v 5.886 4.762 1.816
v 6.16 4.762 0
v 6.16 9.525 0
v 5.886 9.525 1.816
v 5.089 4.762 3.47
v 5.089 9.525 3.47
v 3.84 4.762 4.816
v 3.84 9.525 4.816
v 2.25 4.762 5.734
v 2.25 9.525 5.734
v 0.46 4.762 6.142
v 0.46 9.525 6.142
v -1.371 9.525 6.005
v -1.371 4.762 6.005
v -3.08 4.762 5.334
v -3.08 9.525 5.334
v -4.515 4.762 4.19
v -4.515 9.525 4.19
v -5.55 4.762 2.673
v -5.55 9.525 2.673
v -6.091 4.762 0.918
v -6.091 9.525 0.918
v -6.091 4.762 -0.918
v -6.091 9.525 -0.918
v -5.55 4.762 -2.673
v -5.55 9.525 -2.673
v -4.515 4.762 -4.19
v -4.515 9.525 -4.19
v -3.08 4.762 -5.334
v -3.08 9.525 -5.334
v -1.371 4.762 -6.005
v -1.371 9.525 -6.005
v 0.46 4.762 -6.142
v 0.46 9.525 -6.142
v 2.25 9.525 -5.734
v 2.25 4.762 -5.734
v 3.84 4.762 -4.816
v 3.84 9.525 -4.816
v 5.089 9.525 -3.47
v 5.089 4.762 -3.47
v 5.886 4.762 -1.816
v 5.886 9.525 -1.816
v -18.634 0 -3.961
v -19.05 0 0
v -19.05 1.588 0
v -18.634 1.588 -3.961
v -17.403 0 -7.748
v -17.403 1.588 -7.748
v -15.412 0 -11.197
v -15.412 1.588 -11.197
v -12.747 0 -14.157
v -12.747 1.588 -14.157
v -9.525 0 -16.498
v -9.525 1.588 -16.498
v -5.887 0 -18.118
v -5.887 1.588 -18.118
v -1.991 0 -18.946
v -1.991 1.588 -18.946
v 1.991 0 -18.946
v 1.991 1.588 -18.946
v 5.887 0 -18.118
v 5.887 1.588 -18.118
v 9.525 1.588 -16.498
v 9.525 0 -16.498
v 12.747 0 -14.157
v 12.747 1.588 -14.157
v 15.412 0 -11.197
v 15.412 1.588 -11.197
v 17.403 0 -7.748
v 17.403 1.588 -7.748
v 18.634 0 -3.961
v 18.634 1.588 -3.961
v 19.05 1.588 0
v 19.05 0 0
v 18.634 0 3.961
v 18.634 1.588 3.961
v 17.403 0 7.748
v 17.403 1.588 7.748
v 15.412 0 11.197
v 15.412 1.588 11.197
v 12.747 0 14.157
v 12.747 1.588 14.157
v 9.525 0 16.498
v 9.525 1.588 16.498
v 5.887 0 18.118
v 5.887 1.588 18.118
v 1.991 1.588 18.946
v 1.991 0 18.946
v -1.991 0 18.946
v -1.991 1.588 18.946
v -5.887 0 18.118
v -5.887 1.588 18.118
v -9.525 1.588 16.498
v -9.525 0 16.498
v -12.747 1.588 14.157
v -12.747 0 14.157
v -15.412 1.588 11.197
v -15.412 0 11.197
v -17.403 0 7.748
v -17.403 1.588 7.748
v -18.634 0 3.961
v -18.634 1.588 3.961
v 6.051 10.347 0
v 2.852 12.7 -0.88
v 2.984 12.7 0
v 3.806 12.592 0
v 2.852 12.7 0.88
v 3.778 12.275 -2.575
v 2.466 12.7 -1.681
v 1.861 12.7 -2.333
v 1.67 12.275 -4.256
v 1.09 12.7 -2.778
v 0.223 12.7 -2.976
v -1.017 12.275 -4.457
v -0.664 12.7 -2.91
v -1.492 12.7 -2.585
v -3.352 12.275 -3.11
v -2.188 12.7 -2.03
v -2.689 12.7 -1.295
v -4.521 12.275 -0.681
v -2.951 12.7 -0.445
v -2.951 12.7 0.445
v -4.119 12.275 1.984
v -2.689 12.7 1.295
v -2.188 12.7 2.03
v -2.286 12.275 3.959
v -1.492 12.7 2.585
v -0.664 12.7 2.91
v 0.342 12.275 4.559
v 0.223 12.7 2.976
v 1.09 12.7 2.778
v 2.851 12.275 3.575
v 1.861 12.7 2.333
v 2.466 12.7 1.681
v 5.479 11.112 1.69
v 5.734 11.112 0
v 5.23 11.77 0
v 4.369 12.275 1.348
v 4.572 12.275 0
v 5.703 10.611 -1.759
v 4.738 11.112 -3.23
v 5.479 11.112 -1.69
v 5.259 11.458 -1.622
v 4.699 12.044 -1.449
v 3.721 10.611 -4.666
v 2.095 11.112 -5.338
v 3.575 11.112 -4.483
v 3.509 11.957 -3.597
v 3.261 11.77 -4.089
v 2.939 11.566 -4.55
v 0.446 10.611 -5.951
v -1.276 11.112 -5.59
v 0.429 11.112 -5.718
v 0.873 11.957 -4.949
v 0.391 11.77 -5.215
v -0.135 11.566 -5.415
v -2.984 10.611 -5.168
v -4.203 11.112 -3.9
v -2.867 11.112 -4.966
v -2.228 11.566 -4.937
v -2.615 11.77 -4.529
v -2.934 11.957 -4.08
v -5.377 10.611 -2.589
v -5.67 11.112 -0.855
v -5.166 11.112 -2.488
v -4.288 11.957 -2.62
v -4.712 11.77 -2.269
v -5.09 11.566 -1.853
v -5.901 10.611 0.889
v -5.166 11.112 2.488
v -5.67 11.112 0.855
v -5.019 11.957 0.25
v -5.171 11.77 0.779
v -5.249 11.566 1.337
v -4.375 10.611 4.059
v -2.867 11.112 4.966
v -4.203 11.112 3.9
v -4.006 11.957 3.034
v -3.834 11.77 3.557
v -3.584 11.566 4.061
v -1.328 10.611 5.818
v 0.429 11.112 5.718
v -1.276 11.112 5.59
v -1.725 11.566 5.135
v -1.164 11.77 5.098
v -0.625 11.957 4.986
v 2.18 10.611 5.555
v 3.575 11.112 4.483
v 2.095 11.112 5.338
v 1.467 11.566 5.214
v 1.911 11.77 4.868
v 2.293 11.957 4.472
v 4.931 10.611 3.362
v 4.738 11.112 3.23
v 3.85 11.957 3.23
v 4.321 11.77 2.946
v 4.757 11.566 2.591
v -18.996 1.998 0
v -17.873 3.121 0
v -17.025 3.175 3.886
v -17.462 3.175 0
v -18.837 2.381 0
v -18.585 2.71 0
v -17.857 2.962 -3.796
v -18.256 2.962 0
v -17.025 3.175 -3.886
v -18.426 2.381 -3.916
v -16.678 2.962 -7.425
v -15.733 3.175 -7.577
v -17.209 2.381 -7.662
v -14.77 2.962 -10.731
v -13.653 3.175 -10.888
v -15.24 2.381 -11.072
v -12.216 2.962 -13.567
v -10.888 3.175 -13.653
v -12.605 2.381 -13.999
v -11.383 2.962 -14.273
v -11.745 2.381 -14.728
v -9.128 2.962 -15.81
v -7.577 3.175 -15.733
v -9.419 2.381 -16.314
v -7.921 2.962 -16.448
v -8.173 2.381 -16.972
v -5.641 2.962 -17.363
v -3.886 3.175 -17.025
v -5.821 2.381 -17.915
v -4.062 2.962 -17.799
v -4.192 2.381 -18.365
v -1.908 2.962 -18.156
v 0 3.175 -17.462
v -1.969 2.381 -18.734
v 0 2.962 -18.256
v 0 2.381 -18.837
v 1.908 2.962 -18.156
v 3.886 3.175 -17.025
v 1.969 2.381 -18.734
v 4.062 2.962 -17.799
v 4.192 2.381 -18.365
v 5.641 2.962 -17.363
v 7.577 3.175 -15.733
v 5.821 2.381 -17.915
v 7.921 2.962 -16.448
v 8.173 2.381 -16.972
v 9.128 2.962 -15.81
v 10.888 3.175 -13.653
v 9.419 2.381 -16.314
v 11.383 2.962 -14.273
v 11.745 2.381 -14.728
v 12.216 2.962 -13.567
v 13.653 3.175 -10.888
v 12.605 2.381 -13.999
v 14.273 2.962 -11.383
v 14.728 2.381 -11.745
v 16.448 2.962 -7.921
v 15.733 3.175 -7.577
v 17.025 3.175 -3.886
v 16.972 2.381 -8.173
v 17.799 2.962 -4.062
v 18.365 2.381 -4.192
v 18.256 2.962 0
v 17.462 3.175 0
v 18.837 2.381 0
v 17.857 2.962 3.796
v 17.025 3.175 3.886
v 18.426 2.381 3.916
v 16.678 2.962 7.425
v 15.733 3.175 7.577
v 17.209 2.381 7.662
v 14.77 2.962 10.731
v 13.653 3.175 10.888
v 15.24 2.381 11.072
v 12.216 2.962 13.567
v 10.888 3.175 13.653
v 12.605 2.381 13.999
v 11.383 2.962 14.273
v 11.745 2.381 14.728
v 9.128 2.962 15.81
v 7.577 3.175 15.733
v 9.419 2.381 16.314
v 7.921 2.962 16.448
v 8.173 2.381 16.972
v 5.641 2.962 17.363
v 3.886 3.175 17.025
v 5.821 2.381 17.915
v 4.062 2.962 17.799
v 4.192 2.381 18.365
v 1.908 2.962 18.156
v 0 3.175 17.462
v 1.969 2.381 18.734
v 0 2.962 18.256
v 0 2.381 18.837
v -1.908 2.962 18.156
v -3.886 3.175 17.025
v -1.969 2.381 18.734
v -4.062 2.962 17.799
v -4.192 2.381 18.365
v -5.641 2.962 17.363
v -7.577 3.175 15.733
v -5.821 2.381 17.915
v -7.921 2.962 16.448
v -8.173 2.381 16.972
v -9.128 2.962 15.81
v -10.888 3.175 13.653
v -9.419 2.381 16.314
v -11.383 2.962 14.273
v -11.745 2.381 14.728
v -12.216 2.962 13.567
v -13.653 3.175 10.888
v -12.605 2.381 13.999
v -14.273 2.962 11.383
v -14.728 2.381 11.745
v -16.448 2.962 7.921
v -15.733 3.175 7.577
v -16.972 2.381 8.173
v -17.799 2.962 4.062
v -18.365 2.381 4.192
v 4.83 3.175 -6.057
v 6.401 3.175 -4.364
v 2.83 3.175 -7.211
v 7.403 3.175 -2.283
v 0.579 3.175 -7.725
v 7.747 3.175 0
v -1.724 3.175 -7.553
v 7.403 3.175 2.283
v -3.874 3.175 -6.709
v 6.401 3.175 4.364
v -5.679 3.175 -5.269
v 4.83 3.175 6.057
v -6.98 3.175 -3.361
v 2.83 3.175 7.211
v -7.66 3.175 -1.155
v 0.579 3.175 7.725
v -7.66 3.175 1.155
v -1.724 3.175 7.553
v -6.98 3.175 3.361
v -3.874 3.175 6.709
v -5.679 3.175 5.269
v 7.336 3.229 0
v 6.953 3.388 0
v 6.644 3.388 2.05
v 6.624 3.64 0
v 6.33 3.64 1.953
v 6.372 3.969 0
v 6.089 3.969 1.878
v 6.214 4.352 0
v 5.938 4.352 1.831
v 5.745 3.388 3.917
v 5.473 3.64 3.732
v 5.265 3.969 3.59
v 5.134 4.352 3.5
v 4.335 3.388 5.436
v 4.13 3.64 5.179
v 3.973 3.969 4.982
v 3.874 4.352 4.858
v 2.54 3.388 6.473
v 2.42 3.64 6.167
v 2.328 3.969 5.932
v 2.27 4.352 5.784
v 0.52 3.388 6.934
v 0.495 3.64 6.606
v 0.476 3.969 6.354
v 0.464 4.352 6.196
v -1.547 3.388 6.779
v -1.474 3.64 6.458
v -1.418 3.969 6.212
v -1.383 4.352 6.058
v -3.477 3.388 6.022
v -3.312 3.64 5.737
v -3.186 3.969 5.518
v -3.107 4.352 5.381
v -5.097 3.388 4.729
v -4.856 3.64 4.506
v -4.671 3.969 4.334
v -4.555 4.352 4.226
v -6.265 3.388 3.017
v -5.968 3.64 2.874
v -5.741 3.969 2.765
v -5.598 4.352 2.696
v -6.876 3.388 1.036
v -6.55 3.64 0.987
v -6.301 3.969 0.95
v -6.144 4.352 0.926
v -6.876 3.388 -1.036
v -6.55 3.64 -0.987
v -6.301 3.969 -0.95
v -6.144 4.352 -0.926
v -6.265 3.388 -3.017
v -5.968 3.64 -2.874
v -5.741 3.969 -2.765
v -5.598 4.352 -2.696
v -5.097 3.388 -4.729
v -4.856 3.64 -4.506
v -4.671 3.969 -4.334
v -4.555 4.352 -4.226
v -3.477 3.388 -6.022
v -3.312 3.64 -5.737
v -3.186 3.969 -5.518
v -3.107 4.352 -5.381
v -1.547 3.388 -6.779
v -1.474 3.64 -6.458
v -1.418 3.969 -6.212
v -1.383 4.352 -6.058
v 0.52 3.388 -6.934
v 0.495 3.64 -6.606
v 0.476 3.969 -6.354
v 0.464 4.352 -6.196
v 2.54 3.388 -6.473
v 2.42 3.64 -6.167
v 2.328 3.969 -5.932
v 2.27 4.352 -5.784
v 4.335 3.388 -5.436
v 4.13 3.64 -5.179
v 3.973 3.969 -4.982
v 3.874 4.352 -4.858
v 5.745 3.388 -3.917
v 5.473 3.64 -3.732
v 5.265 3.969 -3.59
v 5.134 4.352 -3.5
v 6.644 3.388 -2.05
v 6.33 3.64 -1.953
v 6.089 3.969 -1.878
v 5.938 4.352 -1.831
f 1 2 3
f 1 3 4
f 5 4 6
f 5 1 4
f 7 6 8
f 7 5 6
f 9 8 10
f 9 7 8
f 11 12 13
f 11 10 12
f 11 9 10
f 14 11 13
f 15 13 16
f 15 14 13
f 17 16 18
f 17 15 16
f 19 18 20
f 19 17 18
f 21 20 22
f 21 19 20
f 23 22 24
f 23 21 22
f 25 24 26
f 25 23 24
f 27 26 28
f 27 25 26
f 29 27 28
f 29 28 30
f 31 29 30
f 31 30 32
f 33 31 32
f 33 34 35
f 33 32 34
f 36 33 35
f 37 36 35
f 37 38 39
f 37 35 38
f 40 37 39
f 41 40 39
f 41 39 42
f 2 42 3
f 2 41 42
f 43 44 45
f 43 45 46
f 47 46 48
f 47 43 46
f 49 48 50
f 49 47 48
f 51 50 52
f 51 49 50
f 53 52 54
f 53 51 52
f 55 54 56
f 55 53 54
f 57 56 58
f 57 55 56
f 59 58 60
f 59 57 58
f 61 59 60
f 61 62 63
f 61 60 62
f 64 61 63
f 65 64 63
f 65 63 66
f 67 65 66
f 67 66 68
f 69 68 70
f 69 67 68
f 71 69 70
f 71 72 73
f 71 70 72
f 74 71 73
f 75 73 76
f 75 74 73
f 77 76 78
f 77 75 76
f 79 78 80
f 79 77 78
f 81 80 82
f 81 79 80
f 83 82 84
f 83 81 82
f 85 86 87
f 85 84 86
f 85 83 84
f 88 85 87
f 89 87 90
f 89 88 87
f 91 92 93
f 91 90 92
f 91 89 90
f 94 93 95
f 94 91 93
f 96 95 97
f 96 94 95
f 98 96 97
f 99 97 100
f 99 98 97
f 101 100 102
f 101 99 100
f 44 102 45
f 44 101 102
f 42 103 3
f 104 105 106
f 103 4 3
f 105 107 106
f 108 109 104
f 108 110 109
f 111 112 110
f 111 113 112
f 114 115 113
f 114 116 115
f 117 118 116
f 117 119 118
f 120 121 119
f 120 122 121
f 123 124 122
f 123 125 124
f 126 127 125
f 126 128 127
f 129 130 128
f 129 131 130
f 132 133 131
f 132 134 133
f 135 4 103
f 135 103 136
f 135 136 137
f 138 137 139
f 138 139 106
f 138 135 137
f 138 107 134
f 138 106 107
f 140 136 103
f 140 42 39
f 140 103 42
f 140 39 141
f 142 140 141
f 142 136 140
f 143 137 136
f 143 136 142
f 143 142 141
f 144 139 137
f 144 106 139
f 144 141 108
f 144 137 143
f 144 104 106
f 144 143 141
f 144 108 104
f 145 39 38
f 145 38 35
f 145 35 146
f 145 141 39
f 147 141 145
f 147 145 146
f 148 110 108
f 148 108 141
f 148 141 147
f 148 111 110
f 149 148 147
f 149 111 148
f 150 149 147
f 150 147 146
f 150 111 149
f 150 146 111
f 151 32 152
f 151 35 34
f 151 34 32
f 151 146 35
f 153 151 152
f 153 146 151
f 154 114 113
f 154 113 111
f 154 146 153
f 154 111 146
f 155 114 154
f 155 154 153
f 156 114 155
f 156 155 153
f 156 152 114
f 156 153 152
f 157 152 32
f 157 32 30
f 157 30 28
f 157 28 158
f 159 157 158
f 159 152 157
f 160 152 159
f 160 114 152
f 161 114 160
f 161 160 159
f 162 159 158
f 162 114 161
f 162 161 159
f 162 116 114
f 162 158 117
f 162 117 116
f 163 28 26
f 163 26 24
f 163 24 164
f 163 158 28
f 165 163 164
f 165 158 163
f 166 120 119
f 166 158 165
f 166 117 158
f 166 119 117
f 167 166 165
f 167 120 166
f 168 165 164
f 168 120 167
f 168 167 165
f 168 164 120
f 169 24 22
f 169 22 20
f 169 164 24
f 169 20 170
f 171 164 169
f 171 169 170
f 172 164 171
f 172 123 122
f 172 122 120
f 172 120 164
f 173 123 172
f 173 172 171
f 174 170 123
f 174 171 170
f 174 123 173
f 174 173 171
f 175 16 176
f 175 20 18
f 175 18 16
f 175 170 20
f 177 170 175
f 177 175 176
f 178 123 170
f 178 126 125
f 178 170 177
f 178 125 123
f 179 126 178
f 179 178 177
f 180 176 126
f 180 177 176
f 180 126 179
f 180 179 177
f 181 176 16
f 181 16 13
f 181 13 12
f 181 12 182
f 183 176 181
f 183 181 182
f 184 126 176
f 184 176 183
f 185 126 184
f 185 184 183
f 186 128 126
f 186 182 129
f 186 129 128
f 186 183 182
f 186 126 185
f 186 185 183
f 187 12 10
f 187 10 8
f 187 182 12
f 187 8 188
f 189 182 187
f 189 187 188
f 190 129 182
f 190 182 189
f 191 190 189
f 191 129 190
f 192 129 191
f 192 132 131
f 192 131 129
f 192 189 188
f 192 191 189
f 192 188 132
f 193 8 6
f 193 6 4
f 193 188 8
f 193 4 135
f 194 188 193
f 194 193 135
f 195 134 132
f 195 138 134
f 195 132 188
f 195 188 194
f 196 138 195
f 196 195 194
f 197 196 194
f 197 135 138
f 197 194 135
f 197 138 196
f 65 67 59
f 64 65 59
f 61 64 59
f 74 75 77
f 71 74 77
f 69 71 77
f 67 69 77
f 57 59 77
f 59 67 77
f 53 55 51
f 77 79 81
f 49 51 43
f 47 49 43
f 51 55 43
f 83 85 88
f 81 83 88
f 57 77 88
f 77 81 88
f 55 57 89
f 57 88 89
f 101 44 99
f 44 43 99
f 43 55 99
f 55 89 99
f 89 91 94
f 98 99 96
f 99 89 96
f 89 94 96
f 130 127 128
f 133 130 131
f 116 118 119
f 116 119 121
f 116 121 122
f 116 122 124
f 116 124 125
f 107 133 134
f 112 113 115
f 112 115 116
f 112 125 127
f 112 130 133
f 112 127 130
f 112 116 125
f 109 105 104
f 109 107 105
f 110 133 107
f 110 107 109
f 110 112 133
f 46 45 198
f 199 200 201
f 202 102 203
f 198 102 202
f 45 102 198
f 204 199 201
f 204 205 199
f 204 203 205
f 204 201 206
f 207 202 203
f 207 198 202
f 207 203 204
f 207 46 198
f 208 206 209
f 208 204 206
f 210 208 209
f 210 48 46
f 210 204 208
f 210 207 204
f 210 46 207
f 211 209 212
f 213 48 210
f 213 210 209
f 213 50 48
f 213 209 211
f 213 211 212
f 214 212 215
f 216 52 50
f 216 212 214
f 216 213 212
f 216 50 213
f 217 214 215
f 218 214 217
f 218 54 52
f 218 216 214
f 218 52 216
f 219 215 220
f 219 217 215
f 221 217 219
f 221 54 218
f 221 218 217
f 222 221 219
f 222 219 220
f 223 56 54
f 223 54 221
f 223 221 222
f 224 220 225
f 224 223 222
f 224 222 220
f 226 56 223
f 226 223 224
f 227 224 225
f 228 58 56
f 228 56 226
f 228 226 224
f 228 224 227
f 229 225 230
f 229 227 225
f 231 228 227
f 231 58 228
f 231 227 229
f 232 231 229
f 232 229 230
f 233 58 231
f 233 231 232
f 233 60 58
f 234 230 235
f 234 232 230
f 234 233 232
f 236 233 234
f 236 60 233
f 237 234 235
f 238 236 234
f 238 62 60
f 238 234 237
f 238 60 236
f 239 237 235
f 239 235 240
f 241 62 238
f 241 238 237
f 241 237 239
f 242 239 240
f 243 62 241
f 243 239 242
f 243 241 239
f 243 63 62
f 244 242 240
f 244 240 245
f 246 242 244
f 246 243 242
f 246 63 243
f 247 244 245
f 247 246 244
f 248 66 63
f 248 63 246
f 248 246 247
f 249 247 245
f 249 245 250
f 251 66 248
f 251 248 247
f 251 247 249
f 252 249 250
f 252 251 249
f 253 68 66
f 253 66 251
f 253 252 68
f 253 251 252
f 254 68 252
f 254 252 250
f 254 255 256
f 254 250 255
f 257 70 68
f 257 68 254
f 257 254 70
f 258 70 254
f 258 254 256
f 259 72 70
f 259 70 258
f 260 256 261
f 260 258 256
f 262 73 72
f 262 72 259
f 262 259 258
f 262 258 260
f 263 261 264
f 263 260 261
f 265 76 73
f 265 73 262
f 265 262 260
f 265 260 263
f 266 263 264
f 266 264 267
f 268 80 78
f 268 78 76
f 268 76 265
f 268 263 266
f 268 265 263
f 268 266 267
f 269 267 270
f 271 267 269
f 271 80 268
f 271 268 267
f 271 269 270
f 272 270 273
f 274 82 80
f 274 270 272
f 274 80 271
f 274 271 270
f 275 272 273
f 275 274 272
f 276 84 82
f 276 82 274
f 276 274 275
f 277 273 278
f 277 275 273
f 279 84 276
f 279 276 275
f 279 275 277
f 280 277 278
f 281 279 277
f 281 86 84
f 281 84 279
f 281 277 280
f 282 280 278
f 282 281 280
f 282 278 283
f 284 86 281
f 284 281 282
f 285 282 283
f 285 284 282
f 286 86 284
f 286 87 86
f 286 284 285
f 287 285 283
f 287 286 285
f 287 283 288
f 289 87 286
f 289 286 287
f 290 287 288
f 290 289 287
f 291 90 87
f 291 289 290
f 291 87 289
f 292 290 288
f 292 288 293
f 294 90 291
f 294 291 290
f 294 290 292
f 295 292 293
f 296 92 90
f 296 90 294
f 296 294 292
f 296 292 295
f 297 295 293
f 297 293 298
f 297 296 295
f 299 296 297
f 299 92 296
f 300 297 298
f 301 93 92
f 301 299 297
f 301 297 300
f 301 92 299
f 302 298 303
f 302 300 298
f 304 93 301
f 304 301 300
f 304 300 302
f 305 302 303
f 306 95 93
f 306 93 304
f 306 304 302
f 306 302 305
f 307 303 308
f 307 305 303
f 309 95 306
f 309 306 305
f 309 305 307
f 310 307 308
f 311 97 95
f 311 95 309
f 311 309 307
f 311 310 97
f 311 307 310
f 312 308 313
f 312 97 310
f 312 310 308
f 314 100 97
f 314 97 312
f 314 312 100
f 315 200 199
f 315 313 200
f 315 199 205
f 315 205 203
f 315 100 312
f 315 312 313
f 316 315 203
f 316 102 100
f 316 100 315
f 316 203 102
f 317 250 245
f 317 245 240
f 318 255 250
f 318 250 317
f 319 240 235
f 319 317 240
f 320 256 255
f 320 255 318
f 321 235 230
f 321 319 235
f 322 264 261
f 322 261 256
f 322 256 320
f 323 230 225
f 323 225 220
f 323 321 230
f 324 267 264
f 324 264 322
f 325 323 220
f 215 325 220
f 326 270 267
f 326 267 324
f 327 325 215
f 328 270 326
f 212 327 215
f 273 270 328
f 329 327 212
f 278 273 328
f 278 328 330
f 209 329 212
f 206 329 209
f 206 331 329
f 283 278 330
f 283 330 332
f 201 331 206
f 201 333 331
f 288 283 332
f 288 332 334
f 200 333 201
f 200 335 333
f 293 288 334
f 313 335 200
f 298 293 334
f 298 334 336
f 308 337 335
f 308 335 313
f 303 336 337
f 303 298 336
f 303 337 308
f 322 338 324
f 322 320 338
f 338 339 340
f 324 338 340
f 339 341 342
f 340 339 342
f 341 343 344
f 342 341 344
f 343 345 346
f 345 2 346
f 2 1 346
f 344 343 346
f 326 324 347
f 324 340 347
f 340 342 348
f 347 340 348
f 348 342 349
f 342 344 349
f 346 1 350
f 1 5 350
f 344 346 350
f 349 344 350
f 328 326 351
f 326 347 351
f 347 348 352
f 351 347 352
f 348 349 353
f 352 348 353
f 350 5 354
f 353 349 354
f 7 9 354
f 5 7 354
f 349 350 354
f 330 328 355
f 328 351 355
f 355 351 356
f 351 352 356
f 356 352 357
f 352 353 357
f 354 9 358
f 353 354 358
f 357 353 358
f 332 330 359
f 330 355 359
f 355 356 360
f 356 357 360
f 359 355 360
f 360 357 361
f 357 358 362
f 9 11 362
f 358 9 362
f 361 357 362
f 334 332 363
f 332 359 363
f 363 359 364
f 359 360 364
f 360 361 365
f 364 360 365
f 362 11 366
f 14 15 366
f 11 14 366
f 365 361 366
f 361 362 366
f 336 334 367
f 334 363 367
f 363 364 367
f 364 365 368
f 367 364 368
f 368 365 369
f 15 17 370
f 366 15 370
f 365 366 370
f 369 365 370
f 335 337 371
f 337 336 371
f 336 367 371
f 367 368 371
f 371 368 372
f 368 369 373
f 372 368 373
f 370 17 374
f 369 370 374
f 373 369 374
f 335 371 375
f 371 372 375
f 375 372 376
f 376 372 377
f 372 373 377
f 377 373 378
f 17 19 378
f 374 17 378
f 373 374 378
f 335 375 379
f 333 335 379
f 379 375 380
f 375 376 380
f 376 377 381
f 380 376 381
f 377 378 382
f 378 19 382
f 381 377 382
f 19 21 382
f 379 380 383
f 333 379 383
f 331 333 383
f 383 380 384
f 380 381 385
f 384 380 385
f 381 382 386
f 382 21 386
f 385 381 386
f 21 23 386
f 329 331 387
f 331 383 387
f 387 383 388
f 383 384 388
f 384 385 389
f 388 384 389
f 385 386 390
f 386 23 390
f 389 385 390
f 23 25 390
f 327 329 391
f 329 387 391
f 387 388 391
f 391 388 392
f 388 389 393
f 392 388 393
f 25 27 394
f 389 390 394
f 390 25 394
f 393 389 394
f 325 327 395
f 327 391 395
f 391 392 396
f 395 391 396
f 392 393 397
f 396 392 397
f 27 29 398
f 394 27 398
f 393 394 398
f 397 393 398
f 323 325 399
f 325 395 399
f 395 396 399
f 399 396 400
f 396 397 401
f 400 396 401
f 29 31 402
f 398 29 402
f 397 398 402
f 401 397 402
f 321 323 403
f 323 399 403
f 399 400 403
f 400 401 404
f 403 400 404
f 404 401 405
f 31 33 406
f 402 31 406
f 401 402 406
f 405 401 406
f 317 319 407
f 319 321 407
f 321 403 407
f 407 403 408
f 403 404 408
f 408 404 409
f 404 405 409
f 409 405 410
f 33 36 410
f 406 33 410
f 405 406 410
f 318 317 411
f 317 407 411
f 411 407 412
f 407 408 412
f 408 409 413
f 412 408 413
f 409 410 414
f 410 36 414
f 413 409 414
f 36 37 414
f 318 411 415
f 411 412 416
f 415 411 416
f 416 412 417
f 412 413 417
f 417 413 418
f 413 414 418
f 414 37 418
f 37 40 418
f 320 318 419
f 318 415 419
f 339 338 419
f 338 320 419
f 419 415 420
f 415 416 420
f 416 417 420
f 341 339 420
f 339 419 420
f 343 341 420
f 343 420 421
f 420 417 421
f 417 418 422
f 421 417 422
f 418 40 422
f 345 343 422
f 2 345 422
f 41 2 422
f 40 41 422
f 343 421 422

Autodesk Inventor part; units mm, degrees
ref_plane "YZ Plane" through (0, 0, 0) normal (1, 0, 0) x (0, 1, 0)
ref_plane "XZ Plane" through (0, 0, 0) normal (0, 1, 0) x (-1, 0, 0)
ref_plane "XY Plane" through (0, 0, 0) normal (0, 0, 1) x (1, 0, 0)
sketch "Sketch1" plane through (0, 0, 0) normal (0, 1, 0) x (-1, 0, 0)
  circle A0 centre (0, 0) radius 19.05
  dimension "d0" = 38.1
extrude "Extrusion1" add sketch "Sketch1" along normal blind 3.175
sketch "Sketch2" plane through (0, 3.175, 0) normal (0, 1, 0) x (1, 0, 0)
  circle A0 centre (0, 0) radius 6.1595
  dimension "d3" = 12.319
extrude "Extrusion2" add sketch "Sketch2" along normal blind 9.525
fillet "Fillet1" radius 1.5875 1 edges at (-6.1595, 3.175, 0)
fillet "Fillet2" radius 3.175 1 edges at (-6.1595, 12.7, 0)
fillet "Fillet3" radius 1.5875 1 edges at (19.05, 3.175, 0)
properties part number "Feet Cap"
